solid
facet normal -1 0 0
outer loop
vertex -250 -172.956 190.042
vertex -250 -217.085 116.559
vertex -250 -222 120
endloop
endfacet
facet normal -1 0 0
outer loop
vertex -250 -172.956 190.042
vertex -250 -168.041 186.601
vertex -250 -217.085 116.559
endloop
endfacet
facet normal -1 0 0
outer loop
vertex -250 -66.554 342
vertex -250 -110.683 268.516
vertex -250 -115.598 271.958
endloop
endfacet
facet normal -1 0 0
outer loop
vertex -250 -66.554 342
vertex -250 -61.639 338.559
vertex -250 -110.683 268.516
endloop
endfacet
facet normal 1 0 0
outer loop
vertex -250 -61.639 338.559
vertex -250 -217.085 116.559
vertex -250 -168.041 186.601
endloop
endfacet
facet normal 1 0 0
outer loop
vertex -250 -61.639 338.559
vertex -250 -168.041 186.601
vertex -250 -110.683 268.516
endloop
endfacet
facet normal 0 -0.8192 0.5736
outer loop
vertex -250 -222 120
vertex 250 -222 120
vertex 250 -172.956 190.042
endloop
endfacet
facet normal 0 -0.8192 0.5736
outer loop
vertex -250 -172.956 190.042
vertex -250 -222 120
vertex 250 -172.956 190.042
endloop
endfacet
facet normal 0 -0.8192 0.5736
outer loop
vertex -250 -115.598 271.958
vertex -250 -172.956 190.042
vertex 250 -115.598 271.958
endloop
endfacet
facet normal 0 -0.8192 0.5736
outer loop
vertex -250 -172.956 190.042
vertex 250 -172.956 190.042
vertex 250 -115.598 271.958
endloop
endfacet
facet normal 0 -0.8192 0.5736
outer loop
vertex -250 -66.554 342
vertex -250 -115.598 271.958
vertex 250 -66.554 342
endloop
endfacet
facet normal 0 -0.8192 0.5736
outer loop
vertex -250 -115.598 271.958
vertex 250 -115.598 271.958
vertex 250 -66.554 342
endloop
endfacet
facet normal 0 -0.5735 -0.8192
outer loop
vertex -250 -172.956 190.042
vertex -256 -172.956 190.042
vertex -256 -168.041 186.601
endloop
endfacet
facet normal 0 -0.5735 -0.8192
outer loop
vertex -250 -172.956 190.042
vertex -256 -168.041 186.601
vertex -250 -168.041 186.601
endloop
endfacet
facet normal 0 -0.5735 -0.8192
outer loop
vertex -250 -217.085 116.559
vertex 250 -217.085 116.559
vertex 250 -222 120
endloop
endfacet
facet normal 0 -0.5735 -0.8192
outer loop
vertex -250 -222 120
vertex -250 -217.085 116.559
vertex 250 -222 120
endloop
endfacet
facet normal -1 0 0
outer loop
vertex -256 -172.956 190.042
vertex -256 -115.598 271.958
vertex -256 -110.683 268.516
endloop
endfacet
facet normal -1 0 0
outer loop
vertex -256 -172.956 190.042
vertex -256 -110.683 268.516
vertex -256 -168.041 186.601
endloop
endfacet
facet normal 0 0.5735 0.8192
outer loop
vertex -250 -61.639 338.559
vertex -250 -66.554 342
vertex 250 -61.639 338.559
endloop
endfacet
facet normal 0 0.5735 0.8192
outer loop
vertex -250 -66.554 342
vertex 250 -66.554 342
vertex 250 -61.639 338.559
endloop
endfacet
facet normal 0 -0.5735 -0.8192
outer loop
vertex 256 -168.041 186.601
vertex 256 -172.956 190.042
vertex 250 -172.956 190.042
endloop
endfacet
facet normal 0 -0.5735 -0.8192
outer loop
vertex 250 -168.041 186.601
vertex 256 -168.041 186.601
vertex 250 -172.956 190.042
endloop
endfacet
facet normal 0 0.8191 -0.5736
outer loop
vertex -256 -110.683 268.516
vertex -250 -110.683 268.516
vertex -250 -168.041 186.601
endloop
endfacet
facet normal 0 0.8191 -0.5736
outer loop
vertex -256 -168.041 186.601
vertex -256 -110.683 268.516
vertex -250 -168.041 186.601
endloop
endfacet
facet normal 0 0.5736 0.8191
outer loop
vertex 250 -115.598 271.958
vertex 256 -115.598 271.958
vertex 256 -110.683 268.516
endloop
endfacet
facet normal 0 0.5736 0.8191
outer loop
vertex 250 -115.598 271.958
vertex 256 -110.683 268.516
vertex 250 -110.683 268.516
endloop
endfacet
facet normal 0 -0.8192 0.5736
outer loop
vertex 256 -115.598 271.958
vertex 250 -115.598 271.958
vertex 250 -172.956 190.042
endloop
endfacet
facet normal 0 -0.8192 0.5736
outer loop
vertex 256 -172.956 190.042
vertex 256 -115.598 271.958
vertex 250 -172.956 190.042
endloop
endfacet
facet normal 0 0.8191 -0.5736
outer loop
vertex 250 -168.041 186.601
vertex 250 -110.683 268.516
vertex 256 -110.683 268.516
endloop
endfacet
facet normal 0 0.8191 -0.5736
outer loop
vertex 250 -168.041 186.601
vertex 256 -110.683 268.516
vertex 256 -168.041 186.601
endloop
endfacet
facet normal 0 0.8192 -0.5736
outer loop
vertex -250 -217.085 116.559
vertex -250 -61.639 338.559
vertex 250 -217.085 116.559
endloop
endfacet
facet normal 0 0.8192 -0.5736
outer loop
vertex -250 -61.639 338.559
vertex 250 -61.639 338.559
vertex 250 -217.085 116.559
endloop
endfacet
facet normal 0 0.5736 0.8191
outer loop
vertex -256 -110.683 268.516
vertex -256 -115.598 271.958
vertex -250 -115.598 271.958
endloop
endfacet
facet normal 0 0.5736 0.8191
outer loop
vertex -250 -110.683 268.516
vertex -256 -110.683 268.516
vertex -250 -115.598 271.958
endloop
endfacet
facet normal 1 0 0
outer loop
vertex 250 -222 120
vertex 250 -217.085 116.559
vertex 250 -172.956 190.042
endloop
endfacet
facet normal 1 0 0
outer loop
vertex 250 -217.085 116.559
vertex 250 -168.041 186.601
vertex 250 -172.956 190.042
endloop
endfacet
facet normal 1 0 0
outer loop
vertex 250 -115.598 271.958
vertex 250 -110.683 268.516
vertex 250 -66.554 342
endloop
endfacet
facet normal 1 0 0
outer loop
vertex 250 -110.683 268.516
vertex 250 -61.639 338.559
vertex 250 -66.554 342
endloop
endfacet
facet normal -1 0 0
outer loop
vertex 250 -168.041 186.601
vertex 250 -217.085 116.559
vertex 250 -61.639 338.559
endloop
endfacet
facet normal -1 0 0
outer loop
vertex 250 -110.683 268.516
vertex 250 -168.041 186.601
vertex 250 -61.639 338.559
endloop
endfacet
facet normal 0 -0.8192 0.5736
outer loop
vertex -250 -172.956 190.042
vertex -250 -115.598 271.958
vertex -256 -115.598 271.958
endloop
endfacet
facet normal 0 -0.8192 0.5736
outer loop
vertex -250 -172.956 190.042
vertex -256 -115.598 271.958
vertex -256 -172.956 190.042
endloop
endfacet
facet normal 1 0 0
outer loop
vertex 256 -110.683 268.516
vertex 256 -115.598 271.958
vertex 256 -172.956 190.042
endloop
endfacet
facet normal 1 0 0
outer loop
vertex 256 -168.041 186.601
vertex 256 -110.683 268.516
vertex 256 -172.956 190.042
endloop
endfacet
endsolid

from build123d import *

# Parameters (mm, degrees)
PAD012_DEPTH = 250
SKETCH023_W  = 100
SKETCH023_H  = 6
PAD015_DEPTH = 6


with BuildPart() as part:
    # Sketch020 → Pad012 (new body, symmetric)
    with BuildSketch(Plane.YZ):
        Polygon((-222, 120), (-66.553927, 342), (-61.639014, 338.558541), (-217.085088, 116.558541), align=None)
    extrude(amount=PAD012_DEPTH, both=True)

    # Sketch023 (on Face1 of Pad012) → Pad015 (join)
    with BuildSketch(Plane(origin=(0, -205.345793, 143.784672), x_dir=(0, -0.573576, -0.819152), z_dir=(0, -0.819152, 0.573576))):
        with Locations((-106.470256, -253)):
            Rectangle(SKETCH023_W, SKETCH023_H)
    pad015 = extrude(amount=-PAD015_DEPTH)

    # Mirrored001: Pad015 across YZ
    add(pad015.mirror(Plane.YZ))


solid = part.part
